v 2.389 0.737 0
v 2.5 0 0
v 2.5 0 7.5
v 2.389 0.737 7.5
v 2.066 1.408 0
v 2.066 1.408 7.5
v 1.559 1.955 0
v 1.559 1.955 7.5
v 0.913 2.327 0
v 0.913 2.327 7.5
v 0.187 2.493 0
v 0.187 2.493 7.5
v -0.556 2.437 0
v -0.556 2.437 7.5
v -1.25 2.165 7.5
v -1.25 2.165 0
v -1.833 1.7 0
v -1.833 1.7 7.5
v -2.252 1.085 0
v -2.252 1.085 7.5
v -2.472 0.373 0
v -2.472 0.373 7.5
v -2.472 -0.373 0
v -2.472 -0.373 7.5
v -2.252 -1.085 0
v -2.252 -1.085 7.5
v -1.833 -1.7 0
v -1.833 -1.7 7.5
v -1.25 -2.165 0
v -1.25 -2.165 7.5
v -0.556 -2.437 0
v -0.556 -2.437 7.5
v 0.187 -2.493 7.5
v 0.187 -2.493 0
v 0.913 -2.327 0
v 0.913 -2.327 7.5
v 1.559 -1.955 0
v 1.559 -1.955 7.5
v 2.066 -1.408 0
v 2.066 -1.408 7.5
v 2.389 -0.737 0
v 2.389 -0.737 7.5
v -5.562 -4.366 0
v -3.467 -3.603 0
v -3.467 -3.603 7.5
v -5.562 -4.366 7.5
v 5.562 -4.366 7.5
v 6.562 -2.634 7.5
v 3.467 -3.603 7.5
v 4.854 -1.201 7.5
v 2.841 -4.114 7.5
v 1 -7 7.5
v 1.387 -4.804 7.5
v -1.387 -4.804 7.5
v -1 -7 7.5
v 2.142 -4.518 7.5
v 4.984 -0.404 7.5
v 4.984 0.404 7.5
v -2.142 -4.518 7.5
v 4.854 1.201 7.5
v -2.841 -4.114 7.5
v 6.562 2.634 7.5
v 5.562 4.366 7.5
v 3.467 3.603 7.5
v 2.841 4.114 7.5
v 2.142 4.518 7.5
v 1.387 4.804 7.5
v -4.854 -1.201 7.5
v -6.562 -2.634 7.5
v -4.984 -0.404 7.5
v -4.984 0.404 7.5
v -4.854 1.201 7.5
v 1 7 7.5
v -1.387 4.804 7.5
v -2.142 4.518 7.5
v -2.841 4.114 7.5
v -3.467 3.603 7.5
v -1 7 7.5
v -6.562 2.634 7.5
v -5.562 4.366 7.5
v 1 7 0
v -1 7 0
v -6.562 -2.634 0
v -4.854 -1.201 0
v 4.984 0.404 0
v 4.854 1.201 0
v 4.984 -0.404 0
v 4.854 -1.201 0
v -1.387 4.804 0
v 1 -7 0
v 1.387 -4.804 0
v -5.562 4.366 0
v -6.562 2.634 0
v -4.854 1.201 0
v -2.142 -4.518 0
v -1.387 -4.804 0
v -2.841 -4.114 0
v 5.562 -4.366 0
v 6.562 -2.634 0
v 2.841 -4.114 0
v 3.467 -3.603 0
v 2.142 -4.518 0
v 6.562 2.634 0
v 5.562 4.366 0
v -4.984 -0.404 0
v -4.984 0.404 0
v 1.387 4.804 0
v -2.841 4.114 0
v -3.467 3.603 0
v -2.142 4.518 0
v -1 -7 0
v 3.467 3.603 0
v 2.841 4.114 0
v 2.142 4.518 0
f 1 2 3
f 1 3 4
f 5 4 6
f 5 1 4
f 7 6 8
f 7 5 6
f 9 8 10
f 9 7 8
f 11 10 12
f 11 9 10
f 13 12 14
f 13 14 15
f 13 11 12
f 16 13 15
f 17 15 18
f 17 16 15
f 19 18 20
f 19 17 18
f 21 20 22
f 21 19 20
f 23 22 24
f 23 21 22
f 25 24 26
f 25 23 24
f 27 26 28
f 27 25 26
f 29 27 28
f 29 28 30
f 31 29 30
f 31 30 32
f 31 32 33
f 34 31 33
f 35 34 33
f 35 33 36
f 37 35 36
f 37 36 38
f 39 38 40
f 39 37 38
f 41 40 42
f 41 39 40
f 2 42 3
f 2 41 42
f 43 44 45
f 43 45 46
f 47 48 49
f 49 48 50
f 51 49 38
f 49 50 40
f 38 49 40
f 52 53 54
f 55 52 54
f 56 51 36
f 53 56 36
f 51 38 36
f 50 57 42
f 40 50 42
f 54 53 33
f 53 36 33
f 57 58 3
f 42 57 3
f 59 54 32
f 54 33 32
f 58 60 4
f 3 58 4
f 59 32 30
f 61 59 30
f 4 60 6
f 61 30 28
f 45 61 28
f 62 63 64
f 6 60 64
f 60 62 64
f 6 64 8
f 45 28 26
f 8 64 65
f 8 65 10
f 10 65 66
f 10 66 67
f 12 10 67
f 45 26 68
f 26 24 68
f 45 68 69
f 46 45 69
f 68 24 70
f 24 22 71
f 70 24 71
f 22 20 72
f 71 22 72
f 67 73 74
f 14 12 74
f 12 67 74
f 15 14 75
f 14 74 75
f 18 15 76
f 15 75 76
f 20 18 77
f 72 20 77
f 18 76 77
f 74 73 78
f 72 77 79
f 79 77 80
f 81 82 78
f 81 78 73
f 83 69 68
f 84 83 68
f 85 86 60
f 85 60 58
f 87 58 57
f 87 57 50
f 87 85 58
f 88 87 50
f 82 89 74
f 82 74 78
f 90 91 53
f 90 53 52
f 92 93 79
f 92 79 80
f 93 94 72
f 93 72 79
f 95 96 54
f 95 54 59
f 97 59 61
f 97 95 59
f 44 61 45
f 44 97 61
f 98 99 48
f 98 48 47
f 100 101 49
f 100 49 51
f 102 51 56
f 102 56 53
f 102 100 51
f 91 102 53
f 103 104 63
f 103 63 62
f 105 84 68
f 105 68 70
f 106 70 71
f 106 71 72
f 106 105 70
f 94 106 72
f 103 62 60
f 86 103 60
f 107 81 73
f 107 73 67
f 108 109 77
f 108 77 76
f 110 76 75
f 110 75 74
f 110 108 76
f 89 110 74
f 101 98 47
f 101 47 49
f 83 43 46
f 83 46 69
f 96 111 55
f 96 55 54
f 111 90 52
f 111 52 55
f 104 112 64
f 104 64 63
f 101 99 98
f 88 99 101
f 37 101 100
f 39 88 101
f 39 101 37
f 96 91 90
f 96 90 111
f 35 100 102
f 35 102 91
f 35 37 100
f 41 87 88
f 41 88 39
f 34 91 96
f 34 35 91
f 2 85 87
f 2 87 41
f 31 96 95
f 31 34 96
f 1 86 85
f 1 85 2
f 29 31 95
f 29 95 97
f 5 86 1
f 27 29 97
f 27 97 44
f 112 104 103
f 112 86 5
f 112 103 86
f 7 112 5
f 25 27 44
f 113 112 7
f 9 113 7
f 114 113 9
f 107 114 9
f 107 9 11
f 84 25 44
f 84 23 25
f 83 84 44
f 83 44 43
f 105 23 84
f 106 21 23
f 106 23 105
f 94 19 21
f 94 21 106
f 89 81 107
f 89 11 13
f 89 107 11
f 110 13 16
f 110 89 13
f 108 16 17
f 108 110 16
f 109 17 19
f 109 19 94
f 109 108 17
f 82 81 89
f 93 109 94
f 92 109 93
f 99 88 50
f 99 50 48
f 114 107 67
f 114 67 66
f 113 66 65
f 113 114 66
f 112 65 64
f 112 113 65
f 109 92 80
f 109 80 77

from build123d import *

# Parameters (mm, degrees)
CROQUIS1_R              = 2.5
SALIENTE_EXTRUIR5_DEPTH = 7.5


with BuildPart() as part:
    # Croquis1 → Saliente-Extruir5 (new body)
    with BuildSketch(Plane.XY):
        with BuildLine():
            Line((-1, 7), (1, 7))
            Line((1, 7), (1.387053768, 4.803757055))
            ThreePointArc((1.387053768, 4.803757055), (2.5, 4.330127019), (3.466648759, 3.603102327))
            Line((3.466648759, 3.603102327), (5.562177826, 4.366025404))
            Line((5.562177826, 4.366025404), (6.562177826, 2.633974596))
            Line((6.562177826, 2.633974596), (4.853702527, 1.200654728))
            ThreePointArc((4.853702527, 1.200654728), (5, 0), (4.853702527, -1.200654728))
            Line((4.853702527, -1.200654728), (6.562177826, -2.633974596))
            Line((6.562177826, -2.633974596), (5.562177826, -4.366025404))
            Line((5.562177826, -4.366025404), (3.466648759, -3.603102327))
            ThreePointArc((3.466648759, -3.603102327), (2.5, -4.330127019), (1.387053768, -4.803757055))
            Line((1.387053768, -4.803757055), (1, -7))
            Line((1, -7), (-1, -7))
            Line((-1, -7), (-1.387053768, -4.803757055))
            ThreePointArc((-1.387053768, -4.803757055), (-2.5, -4.330127019), (-3.466648759, -3.603102327))
            Line((-3.466648759, -3.603102327), (-5.562177826, -4.366025404))
            Line((-5.562177826, -4.366025404), (-6.562177826, -2.633974596))
            Line((-6.562177826, -2.633974596), (-4.853702527, -1.200654728))
            ThreePointArc((-4.853702527, -1.200654728), (-5, 0), (-4.853702527, 1.200654728))
            Line((-4.853702527, 1.200654728), (-6.562177826, 2.633974596))
            Line((-6.562177826, 2.633974596), (-5.562177826, 4.366025404))
            Line((-5.562177826, 4.366025404), (-3.466648759, 3.603102327))
            ThreePointArc((-3.466648759, 3.603102327), (-2.5, 4.330127019), (-1.387053768, 4.803757055))
            Line((-1.387053768, 4.803757055), (-1, 7))
        make_face()
        Circle(CROQUIS1_R, mode=Mode.SUBTRACT)
    extrude(amount=SALIENTE_EXTRUIR5_DEPTH)


solid = part.part
